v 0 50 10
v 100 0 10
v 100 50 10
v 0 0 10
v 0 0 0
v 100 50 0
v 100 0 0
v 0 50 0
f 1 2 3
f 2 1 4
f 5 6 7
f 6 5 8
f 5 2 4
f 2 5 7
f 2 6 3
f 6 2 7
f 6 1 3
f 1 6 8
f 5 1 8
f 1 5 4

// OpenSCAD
// 100 x 50 x 10 mm: fits the default 256^3 bed.
cube([100, 50, 10]);
